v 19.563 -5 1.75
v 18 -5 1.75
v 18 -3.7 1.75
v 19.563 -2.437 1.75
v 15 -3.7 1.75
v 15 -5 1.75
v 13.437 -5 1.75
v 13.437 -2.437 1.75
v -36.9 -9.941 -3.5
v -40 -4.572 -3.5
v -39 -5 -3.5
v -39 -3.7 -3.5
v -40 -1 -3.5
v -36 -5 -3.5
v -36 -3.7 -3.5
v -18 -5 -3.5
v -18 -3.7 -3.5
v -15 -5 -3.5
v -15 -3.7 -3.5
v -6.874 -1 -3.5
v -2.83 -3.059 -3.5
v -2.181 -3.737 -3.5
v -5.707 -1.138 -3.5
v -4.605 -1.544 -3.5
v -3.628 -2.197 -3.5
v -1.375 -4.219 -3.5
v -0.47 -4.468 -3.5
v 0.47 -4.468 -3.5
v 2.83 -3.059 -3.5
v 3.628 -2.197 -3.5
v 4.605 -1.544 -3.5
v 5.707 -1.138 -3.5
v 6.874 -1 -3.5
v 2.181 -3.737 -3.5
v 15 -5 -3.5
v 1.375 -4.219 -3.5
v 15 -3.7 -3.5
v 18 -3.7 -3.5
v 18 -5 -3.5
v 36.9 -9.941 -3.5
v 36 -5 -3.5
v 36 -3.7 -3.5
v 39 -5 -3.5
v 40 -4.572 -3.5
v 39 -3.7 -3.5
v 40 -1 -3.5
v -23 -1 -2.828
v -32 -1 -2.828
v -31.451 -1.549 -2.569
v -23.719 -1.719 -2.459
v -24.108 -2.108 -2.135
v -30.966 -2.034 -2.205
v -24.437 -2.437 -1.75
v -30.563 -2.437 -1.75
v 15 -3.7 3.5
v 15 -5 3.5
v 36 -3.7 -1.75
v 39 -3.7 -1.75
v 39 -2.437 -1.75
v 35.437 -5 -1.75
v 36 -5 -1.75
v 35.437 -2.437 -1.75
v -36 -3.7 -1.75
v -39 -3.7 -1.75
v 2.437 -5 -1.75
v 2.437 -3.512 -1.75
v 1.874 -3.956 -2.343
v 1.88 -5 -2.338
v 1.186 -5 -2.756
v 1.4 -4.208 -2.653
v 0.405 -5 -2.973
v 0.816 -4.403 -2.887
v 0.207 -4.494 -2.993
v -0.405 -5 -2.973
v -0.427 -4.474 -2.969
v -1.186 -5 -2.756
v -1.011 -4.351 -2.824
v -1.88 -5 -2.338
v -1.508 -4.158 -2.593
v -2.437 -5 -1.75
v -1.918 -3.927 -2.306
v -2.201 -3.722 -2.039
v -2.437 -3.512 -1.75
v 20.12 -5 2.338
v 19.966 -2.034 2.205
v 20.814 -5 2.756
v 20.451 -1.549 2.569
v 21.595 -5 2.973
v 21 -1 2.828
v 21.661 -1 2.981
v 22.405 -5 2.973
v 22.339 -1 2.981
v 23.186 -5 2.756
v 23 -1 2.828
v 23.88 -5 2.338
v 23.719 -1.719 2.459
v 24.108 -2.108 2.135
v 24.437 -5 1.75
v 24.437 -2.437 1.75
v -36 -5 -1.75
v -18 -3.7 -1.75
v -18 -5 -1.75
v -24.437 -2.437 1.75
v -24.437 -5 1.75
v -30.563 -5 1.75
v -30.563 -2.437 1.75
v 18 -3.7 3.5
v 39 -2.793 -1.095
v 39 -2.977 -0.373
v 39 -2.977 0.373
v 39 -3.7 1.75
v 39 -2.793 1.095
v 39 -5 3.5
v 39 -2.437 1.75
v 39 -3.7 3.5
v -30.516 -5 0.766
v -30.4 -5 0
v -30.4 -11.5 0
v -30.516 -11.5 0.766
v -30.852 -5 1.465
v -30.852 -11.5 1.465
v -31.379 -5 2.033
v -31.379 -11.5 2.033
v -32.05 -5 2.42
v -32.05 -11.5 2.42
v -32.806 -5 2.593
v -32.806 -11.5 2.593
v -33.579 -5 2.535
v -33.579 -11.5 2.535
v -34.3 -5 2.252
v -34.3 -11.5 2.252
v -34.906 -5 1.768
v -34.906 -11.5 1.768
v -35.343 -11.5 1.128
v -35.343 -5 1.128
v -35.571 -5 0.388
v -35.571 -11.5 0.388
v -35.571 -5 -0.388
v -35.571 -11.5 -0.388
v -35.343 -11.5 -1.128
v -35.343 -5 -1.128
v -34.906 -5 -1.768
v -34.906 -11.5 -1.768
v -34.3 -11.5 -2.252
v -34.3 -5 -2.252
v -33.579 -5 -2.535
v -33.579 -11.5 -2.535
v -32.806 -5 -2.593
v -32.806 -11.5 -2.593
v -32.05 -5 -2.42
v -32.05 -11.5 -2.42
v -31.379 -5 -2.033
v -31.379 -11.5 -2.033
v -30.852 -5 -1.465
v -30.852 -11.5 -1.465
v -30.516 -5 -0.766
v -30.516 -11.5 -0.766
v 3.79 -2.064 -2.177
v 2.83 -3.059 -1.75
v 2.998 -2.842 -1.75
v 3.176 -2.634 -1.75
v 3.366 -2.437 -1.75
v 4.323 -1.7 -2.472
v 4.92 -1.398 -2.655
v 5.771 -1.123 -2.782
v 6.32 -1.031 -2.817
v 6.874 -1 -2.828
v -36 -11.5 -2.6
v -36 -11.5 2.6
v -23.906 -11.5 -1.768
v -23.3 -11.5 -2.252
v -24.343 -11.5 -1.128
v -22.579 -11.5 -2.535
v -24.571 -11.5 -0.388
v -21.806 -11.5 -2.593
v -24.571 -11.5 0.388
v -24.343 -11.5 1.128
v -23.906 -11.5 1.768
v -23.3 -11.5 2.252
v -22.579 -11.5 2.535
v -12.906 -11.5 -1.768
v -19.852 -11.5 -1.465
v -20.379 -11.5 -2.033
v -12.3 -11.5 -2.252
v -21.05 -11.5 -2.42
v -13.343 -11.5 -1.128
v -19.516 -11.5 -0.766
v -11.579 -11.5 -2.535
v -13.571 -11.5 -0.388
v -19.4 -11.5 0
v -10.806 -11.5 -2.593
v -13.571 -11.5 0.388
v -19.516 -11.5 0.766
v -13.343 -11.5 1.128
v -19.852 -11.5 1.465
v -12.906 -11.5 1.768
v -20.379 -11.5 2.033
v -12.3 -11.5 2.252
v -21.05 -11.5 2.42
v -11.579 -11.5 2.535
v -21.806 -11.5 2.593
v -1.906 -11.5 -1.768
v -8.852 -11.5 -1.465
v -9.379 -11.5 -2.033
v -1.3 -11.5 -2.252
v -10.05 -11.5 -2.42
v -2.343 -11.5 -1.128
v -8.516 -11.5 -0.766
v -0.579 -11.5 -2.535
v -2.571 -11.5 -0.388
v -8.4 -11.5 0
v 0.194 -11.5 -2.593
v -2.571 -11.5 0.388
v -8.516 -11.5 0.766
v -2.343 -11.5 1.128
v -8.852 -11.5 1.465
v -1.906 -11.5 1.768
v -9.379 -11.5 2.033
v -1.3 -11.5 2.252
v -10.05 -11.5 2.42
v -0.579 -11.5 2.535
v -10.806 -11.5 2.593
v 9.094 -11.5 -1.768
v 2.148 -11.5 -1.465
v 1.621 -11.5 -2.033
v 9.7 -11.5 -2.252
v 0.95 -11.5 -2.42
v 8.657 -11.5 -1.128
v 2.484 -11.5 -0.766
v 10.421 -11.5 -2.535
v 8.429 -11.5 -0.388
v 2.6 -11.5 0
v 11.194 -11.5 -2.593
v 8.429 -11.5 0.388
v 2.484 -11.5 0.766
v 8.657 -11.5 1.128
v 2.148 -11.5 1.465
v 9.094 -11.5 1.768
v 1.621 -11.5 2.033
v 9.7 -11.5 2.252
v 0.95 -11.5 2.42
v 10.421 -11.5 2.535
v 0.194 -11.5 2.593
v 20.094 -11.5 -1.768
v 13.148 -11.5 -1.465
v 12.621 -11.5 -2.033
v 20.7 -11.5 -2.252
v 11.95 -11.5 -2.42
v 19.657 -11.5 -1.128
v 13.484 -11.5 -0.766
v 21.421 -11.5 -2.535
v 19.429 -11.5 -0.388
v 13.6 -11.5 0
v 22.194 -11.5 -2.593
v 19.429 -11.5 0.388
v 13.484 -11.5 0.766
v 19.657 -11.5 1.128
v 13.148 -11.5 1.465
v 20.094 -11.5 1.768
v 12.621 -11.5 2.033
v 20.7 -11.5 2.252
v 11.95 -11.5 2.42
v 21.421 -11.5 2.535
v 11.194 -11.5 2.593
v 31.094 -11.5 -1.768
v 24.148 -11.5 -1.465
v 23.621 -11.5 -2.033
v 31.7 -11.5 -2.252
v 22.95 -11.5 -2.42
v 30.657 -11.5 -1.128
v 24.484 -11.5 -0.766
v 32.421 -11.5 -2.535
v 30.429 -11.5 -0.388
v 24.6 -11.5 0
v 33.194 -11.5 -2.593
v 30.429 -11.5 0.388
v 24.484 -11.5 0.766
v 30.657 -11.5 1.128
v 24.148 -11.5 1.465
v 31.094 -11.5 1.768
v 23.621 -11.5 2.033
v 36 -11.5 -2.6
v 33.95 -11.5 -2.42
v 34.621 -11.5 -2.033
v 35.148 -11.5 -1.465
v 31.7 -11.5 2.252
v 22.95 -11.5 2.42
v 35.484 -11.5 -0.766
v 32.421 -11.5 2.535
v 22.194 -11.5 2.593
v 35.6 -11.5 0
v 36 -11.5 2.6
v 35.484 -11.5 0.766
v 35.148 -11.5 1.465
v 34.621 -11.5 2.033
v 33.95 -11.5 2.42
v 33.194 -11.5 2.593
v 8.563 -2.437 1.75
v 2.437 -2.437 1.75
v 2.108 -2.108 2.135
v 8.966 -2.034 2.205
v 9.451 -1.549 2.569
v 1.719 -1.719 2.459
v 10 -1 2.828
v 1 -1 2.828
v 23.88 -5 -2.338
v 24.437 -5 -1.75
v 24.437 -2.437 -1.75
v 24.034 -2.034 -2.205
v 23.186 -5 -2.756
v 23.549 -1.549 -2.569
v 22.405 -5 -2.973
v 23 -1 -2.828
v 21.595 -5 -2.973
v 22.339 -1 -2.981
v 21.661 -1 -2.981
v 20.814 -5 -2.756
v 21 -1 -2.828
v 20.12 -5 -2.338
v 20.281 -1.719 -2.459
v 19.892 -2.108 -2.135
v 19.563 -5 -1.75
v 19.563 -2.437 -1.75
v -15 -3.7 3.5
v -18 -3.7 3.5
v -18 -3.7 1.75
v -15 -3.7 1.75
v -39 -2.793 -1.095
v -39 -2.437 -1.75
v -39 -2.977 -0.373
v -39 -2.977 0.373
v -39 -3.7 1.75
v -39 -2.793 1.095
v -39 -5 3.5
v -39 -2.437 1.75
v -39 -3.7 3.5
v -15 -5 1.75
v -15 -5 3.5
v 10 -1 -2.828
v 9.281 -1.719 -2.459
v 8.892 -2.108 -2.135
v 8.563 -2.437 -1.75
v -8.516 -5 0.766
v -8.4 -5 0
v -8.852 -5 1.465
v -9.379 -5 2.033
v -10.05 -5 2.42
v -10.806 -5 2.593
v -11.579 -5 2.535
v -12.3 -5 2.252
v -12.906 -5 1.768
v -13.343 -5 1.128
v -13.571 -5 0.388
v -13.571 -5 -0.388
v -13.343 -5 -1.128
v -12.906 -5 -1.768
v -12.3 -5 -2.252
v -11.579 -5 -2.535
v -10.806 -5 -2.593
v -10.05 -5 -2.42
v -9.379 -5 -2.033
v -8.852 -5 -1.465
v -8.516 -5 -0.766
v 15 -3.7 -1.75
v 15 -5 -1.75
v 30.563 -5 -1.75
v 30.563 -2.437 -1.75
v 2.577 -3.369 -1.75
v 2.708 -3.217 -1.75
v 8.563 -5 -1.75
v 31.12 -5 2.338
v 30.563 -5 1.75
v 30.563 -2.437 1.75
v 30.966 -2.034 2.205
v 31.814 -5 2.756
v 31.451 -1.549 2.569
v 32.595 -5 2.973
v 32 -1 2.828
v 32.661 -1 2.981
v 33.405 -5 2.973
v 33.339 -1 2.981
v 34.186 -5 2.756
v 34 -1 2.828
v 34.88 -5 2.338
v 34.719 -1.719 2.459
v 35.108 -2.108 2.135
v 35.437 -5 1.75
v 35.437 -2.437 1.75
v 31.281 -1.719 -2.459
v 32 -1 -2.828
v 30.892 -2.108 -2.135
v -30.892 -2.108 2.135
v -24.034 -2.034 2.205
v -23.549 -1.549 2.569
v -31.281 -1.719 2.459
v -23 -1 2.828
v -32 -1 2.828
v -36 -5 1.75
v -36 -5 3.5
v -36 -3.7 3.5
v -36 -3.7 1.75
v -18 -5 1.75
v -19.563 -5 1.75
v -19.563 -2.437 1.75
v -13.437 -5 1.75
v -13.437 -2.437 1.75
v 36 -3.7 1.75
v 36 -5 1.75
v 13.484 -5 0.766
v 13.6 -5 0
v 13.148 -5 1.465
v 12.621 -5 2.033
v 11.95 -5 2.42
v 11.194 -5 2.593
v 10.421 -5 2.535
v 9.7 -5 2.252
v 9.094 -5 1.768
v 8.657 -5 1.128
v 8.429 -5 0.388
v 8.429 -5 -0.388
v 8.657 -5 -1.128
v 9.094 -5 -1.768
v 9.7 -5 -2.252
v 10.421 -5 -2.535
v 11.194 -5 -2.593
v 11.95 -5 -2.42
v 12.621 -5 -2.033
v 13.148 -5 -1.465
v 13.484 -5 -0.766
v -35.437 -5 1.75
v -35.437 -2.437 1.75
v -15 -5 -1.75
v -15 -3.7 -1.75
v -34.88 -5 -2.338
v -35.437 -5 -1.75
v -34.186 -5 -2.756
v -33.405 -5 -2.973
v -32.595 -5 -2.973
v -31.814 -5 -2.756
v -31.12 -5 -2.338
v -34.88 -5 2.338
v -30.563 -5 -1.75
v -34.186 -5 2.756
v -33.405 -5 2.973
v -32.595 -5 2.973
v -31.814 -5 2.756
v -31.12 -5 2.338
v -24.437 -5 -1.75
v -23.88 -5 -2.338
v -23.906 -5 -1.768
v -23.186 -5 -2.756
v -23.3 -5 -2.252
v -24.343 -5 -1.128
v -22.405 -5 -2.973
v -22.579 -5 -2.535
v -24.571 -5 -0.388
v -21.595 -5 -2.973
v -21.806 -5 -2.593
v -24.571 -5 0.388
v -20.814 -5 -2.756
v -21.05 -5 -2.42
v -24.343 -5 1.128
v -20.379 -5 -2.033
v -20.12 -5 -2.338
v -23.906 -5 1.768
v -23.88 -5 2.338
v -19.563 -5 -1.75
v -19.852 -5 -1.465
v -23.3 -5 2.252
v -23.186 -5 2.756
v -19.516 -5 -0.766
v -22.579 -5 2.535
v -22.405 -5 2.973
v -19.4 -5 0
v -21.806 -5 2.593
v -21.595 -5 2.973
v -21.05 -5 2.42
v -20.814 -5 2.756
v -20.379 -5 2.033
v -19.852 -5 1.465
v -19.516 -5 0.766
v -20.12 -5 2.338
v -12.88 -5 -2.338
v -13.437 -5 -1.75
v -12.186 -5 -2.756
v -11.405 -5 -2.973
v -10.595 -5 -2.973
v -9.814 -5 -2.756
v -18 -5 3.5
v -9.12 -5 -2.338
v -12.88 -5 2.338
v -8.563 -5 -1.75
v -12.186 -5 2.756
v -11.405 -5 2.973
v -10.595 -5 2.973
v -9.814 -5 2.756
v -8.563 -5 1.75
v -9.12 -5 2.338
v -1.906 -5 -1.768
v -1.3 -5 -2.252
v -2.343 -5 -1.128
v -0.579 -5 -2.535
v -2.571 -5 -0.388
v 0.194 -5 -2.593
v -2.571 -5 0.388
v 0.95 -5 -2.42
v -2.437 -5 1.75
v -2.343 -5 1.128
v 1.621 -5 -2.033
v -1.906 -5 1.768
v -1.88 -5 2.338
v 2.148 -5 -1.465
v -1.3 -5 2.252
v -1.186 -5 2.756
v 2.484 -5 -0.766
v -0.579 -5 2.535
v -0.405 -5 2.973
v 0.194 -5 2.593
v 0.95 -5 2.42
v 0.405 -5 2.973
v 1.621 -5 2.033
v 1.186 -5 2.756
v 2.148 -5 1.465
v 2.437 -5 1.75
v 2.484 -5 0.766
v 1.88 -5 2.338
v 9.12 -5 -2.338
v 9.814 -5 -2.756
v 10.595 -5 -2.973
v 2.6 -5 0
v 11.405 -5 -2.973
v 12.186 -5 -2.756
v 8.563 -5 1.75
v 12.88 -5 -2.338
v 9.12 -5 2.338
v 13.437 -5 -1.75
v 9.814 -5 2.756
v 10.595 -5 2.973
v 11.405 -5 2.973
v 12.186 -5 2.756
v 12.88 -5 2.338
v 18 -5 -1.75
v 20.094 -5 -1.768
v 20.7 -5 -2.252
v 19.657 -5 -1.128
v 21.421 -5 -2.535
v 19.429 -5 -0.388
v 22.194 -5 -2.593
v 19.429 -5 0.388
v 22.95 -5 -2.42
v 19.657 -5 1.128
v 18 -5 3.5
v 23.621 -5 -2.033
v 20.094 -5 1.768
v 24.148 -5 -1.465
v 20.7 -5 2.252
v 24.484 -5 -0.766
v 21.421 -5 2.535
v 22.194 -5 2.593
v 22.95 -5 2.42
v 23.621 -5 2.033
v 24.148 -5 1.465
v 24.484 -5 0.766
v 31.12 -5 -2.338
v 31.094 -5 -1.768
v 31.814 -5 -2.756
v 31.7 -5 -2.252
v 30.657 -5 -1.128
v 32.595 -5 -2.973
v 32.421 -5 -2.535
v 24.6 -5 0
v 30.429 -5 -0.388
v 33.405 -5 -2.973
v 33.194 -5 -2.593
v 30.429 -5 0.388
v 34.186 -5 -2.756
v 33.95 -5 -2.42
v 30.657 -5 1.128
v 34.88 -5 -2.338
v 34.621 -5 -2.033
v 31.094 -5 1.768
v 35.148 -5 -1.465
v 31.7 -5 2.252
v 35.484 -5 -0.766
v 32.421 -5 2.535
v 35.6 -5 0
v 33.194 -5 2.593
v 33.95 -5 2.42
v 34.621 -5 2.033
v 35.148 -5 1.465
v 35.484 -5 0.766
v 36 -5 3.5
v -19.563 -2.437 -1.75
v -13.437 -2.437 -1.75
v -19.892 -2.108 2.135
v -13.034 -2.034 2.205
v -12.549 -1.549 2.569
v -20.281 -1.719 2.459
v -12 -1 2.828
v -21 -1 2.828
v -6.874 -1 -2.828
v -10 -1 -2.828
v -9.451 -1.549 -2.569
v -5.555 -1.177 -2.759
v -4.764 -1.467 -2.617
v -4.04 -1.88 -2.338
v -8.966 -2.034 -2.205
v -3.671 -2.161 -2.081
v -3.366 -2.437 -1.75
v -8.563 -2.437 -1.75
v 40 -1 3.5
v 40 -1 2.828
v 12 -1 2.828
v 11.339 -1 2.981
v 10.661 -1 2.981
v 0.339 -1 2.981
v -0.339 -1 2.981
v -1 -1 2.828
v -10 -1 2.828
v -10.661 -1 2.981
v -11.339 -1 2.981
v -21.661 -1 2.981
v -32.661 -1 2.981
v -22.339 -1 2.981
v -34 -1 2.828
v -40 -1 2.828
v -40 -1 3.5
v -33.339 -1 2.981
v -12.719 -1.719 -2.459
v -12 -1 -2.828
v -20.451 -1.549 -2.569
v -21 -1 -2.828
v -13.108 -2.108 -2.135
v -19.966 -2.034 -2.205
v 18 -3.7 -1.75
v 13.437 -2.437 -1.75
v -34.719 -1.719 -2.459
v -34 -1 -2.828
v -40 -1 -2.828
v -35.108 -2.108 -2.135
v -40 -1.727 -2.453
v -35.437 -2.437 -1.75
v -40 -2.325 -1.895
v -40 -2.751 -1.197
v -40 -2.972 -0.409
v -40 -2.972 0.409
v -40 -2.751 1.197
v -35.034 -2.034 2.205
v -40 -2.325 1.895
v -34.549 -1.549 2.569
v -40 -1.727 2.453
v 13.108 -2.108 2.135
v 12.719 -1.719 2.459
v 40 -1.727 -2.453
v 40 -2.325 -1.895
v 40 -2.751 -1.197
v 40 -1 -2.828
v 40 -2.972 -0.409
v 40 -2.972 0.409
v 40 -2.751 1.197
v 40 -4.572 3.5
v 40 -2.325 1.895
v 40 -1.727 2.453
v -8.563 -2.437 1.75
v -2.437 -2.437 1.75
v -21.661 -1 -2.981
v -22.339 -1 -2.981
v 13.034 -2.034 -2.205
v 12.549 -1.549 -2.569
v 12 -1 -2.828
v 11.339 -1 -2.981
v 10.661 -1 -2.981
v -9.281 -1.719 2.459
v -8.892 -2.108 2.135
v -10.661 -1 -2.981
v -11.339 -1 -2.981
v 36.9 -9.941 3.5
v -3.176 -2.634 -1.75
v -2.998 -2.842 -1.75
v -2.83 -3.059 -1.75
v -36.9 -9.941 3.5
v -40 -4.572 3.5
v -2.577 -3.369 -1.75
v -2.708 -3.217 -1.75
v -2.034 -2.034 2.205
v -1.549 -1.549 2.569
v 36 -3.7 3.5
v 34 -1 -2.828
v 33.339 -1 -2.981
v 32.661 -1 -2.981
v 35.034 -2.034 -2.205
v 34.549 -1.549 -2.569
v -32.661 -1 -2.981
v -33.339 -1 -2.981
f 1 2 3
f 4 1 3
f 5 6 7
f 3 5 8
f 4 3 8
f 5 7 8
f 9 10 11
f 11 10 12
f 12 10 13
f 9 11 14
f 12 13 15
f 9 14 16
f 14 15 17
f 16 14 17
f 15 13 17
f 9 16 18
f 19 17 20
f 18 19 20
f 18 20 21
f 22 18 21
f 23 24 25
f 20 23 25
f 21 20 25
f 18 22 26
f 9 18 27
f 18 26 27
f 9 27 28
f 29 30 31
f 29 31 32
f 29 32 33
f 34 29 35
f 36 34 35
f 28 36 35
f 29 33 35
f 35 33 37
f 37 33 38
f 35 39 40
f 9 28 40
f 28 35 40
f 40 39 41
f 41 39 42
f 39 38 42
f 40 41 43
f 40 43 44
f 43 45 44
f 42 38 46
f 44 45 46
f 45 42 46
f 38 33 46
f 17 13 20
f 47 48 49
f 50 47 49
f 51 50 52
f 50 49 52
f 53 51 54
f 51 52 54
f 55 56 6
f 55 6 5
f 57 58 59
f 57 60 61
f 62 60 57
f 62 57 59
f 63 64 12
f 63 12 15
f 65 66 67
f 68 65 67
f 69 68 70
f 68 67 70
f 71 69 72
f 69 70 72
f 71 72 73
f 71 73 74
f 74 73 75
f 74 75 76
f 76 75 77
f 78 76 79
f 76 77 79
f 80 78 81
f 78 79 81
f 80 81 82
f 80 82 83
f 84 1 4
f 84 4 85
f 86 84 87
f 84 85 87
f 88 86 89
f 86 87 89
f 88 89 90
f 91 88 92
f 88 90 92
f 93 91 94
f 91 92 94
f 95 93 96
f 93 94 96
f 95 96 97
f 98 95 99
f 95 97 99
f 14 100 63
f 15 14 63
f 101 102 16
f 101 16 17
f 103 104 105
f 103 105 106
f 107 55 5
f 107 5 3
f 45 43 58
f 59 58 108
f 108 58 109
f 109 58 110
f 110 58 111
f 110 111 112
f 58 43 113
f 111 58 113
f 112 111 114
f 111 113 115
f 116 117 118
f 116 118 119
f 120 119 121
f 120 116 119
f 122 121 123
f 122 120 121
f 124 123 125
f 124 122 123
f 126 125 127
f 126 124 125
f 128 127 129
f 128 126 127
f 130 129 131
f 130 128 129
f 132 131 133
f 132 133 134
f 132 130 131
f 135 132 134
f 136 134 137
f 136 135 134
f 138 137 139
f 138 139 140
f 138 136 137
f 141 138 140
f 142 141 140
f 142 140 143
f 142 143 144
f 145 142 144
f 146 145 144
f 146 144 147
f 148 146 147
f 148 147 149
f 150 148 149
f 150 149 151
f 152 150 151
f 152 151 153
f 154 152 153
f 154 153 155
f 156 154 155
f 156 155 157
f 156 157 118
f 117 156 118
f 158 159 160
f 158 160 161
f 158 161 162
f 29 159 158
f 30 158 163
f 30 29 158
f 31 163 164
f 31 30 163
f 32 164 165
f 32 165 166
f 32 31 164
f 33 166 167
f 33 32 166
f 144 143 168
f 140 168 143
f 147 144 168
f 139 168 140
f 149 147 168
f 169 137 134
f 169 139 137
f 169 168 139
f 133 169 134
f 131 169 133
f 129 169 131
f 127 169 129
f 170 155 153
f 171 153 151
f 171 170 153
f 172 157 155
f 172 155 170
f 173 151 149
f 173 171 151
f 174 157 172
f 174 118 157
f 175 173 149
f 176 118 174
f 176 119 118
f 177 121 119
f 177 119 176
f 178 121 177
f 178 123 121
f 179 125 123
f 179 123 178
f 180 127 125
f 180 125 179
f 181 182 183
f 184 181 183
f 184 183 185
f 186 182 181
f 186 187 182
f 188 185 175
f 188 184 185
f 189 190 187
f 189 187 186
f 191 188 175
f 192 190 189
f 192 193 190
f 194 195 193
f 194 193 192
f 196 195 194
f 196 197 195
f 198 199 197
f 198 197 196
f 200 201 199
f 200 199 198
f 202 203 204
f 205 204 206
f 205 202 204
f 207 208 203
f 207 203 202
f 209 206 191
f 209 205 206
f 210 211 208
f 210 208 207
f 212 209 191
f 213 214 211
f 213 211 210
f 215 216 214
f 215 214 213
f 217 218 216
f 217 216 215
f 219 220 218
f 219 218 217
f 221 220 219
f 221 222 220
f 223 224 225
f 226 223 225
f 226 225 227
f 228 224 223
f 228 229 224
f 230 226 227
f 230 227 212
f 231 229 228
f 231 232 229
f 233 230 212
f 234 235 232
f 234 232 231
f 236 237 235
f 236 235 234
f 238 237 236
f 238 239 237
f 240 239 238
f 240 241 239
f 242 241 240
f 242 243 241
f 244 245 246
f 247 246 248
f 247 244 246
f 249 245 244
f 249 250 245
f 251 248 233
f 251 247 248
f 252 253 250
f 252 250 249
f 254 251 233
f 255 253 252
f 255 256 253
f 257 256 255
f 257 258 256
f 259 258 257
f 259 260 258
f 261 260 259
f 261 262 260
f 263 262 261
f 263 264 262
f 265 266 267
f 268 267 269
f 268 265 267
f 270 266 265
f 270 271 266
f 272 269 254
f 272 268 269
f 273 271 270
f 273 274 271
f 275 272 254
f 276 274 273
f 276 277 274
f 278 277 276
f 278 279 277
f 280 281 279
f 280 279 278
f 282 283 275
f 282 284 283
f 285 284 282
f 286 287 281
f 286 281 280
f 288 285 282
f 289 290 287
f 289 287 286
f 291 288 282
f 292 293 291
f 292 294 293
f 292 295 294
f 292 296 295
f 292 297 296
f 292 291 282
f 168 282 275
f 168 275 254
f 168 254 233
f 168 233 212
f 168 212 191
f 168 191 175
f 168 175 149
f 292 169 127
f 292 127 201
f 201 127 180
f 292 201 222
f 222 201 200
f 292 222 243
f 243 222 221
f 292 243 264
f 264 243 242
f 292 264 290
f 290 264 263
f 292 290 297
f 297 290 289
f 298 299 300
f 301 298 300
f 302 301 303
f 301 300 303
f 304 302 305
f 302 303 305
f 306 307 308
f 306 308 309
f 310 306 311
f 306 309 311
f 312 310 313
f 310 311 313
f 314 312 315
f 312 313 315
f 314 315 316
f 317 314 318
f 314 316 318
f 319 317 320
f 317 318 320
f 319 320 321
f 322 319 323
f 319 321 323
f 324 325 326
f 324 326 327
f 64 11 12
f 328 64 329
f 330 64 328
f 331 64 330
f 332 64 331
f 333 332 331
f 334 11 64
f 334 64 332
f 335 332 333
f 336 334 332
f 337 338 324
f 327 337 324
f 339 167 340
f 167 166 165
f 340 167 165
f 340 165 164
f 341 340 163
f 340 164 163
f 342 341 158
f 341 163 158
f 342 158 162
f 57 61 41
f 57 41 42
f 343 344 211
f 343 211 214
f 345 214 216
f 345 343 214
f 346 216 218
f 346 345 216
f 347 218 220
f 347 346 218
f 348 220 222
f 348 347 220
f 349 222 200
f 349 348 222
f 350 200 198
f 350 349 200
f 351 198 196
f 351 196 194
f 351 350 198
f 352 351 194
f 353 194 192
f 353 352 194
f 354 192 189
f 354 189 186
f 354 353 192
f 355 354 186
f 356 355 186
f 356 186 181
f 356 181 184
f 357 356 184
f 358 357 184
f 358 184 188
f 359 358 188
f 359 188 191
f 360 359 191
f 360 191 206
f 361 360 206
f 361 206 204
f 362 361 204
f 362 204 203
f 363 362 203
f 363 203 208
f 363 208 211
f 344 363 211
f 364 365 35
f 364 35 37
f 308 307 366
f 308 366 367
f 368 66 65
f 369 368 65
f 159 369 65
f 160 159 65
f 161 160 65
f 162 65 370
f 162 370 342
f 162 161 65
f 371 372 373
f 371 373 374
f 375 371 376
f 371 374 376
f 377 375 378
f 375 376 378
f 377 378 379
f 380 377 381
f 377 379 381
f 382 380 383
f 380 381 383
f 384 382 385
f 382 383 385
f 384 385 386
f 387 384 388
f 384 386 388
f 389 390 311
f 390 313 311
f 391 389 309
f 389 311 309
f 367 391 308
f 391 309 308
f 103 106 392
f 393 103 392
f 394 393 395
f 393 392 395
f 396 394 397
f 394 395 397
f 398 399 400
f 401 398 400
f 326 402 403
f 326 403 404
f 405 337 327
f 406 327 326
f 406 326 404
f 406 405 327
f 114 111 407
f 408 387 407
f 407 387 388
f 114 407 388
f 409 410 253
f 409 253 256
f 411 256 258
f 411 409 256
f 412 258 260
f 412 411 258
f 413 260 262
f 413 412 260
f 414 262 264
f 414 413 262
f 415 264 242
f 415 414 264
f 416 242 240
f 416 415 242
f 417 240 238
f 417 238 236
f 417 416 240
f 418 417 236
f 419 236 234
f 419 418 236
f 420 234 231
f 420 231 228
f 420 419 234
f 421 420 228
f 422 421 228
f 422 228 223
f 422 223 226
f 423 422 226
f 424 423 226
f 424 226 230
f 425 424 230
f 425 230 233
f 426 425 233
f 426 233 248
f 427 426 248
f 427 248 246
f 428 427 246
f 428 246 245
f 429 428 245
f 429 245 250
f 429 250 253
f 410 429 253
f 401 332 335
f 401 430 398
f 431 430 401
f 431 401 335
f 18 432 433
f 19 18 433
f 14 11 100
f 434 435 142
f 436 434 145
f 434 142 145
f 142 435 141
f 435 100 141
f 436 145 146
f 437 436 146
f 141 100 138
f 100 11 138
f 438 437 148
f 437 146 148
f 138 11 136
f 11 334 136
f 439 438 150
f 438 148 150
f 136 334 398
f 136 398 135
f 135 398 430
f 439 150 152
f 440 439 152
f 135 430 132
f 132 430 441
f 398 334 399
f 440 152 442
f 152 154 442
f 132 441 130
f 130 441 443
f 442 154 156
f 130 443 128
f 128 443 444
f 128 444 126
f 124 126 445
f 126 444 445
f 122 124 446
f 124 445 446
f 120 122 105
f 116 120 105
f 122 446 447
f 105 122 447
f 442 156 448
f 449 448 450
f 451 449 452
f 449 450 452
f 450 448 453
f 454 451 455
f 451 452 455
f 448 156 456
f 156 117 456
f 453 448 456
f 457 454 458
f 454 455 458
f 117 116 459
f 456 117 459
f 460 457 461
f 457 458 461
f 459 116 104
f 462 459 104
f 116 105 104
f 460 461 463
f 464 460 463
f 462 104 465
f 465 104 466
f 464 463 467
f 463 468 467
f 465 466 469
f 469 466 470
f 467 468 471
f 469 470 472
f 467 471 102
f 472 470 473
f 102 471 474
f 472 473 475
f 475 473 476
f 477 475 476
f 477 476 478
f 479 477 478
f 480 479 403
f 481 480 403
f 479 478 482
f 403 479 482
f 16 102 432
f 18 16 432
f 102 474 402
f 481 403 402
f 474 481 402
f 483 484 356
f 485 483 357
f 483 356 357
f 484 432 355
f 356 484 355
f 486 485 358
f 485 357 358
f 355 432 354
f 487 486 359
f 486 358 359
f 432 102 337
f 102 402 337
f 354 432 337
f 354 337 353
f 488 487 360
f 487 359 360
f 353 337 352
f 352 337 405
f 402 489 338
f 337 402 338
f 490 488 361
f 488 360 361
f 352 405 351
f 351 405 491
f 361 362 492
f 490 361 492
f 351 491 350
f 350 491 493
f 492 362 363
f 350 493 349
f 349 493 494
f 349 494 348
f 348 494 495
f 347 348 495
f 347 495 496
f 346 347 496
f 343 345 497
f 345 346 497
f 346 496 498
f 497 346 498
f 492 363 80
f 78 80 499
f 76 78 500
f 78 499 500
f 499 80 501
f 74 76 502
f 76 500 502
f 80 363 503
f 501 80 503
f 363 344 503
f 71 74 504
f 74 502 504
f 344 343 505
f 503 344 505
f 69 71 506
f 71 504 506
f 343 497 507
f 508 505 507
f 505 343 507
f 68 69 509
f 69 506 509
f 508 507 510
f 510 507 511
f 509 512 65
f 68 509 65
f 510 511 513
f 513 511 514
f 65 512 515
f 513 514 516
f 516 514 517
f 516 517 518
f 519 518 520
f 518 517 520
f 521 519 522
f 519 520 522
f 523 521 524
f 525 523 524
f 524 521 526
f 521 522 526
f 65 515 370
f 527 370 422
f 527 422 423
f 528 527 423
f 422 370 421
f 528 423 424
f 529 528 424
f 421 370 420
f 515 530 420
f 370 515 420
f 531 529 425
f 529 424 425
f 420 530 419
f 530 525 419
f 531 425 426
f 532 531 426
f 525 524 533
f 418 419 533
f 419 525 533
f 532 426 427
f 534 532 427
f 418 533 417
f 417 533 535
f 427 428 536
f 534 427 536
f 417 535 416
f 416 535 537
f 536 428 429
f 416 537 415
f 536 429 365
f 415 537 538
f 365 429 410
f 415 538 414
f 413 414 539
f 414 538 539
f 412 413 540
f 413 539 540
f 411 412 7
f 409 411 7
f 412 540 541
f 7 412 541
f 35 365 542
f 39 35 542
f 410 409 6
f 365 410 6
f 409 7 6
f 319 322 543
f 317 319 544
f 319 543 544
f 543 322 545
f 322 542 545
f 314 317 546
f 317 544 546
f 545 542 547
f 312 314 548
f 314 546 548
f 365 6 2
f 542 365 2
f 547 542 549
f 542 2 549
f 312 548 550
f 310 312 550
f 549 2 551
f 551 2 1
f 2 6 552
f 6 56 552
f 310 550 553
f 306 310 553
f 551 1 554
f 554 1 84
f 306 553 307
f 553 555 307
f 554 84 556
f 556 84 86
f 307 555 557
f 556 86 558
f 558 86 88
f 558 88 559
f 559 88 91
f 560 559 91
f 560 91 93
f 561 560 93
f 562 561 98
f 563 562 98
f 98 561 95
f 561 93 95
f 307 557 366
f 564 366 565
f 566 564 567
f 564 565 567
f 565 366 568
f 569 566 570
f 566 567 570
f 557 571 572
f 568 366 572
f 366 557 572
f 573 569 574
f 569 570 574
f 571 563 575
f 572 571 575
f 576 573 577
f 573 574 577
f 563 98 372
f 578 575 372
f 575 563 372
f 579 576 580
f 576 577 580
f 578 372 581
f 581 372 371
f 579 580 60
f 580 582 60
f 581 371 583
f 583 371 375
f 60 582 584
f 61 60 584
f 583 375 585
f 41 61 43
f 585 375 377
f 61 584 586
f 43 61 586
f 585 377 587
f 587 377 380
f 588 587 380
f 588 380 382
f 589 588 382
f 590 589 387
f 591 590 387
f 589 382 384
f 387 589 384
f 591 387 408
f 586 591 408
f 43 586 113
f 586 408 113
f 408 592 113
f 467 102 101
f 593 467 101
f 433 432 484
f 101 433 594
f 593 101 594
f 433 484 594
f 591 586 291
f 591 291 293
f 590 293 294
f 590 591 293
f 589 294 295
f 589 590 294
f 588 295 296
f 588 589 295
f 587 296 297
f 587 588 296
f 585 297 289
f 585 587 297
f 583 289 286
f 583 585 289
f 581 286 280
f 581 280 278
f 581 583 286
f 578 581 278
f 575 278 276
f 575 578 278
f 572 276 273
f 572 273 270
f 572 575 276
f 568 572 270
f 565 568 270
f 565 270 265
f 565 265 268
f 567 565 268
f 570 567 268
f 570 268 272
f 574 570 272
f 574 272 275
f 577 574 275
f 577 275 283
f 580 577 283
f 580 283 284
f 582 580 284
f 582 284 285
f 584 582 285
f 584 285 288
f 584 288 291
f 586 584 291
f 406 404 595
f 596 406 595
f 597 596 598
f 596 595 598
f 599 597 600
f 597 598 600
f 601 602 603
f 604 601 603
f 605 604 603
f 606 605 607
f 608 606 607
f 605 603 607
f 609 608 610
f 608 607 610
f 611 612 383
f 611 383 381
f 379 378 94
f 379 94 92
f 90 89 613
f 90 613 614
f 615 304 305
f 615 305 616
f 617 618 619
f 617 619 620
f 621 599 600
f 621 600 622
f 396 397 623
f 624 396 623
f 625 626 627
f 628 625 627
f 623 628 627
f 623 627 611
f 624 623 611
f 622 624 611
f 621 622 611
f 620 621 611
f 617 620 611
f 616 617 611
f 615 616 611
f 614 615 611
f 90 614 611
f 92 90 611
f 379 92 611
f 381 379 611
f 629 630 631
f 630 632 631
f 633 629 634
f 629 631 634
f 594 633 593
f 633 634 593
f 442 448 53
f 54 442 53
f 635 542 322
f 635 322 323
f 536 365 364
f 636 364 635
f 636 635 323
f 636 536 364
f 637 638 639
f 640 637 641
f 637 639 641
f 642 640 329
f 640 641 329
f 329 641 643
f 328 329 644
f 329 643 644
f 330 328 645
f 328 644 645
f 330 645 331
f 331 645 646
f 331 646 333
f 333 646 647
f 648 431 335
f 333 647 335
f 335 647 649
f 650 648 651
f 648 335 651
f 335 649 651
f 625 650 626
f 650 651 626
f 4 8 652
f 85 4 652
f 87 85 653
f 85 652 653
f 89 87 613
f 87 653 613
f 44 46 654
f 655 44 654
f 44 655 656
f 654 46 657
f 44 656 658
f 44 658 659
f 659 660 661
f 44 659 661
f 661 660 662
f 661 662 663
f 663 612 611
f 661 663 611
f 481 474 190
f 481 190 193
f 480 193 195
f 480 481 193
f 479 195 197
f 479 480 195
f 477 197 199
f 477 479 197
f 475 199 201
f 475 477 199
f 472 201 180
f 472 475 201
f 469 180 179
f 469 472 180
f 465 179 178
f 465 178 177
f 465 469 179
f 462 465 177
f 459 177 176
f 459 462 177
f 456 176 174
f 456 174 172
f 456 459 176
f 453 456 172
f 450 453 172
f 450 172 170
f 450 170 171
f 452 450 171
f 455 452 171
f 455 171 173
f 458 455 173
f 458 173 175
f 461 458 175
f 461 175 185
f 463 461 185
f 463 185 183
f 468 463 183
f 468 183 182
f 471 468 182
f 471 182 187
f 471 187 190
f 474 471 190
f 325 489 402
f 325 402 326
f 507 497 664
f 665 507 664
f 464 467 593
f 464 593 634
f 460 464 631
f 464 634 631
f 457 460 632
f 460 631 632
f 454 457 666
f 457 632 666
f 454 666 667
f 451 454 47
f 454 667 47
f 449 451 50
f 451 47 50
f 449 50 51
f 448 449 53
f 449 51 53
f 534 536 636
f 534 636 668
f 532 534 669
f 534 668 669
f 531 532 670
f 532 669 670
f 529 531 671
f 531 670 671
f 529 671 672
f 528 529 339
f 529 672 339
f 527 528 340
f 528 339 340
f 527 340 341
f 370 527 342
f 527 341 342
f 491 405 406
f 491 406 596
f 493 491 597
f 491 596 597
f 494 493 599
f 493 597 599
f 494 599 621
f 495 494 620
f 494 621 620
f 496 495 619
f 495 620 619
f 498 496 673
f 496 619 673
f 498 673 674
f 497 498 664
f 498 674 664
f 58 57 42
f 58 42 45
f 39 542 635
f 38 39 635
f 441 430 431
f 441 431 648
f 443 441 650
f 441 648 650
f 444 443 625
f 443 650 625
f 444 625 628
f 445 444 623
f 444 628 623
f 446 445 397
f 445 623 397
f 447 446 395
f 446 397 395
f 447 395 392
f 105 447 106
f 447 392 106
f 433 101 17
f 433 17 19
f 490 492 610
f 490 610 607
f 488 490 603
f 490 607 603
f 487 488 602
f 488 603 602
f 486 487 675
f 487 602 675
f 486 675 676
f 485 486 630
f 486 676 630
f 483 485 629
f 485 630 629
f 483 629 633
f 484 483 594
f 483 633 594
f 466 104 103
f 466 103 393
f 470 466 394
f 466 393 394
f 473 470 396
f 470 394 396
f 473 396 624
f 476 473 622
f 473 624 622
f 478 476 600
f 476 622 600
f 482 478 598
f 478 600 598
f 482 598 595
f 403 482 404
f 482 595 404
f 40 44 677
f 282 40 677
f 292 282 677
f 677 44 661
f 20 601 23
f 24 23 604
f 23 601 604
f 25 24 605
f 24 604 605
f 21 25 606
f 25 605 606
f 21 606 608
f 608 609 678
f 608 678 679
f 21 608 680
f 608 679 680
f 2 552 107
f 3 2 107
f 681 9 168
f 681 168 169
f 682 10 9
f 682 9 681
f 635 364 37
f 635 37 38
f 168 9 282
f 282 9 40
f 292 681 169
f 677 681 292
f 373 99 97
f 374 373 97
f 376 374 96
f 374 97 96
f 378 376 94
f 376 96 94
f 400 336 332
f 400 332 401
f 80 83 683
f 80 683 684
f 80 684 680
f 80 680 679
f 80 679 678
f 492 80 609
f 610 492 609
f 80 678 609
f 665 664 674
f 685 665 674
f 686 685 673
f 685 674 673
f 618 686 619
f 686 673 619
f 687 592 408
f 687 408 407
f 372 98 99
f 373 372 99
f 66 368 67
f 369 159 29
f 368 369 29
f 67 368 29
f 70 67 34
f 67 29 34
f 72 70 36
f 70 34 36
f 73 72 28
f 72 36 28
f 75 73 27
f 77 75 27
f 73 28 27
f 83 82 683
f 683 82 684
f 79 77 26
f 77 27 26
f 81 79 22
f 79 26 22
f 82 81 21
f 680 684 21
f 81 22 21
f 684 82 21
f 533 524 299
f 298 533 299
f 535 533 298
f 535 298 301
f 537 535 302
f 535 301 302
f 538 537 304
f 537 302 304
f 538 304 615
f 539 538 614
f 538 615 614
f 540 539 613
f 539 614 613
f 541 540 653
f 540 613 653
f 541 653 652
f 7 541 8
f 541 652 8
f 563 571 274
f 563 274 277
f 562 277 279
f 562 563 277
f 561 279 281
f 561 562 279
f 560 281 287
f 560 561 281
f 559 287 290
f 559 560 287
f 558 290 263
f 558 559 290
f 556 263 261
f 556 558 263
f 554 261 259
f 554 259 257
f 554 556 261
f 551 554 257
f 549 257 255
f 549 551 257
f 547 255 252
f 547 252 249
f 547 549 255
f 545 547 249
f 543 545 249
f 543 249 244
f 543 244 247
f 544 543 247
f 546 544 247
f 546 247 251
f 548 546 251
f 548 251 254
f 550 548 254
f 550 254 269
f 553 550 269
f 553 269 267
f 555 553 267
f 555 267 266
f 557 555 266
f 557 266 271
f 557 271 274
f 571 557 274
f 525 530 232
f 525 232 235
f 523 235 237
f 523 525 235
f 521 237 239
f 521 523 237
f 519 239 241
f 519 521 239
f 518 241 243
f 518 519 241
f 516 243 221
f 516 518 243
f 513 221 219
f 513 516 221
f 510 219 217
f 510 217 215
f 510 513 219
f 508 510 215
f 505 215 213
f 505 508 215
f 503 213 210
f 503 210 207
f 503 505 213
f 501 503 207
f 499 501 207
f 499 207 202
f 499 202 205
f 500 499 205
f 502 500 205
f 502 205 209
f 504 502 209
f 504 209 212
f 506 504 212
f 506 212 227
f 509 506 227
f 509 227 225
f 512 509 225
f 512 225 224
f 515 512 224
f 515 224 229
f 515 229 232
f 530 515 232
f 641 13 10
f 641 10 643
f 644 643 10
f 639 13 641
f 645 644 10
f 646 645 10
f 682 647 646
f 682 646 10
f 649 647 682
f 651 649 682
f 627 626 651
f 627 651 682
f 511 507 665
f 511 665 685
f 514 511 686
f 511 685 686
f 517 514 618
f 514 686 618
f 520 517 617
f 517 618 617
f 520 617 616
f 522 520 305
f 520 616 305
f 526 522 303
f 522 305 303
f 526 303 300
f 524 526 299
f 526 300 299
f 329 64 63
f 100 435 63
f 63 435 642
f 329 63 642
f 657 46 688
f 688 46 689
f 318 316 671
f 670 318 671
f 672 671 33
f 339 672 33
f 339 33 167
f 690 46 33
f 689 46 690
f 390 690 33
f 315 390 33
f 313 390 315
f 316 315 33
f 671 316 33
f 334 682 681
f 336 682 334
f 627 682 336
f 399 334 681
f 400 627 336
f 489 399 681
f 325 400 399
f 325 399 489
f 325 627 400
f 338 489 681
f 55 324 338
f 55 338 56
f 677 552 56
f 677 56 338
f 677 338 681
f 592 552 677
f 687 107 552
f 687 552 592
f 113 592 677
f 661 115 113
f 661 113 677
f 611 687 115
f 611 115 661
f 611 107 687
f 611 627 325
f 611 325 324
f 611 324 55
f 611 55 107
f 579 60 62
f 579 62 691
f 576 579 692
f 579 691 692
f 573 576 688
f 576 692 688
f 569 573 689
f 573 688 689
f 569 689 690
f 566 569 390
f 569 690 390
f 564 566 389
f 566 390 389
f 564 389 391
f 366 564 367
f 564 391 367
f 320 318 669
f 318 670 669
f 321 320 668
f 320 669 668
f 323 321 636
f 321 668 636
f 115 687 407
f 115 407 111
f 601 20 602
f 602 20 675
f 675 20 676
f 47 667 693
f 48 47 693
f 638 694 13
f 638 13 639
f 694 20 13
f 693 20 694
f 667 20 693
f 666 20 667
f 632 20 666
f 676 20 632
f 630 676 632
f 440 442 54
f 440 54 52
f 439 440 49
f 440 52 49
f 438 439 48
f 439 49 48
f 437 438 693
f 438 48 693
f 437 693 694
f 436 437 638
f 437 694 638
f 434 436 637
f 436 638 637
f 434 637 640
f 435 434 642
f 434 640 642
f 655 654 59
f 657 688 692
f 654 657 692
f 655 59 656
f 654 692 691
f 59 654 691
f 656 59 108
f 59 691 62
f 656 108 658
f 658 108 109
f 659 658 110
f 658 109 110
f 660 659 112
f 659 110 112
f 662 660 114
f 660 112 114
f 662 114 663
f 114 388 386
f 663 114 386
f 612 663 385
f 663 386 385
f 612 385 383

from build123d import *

# Parameters (mm, degrees)
F0_W          = 80
F0_H          = 7
F0_R          = 2.6
F1_DEPTH      = 11.5
F2_R          = 3
F3_DEPTH      = 5
F4_R          = 3
F5_DEPTH      = 80.001
F6_W          = 4
F6_H          = 3.5
F7_DEPTH      = 39
F7_DEPTH_BACK = 39
F8_SIZE2      = 6.9282032303
F8_SIZE       = 4
F9_SIZE2      = 1.558836
F9_SIZE       = 0.89999
F10_W         = 2
F10_H         = 10.311042398
F11_DEPTH     = 80.001
F12_R         = 3.5
F13_DEPTH     = 1.75
F14_T4_DEPTH  = 17.5408905874
F14_T9_DEPTH  = 17.5408905874
F15_W         = 3
F15_H         = 1.3
F16_DEPTH     = 7.0010001


# Not quite as in the source:
# - a fillet or chamfer that OpenCascade refuses, or shapes differently, is made with other operations: its cross-section is extruded or revolved along the edge and cut away or added
# - a fillet or chamfer is up to 0.001 mm smaller than in the source, because OpenCascade refuses the exact size


with BuildPart() as f1:
    # F0 (on Front) → F1 (new body)
    with BuildSketch(Plane.XZ):
        Rectangle(F0_W, F0_H)
        with Locations((-33, 0)):
            Circle(F0_R, mode=Mode.SUBTRACT)
        with Locations((-22, 0)):
            Circle(F0_R, mode=Mode.SUBTRACT)
        with Locations((-11, 0)):
            Circle(F0_R, mode=Mode.SUBTRACT)
        Circle(F0_R, mode=Mode.SUBTRACT)
        with Locations((11, 0)):
            Circle(F0_R, mode=Mode.SUBTRACT)
        with Locations((22, 0)):
            Circle(F0_R, mode=Mode.SUBTRACT)
        with Locations((33, 0)):
            Circle(F0_R, mode=Mode.SUBTRACT)
    extrude(amount=F1_DEPTH)

    # F2 (on face) → F3 (cut)
    with BuildSketch(Plane(origin=(0, 0, 0), x_dir=(-1, 0, 0), z_dir=(0, 1, 0))):
        Circle(F2_R)
        with Locations((11, 0)):
            Circle(F2_R)
        with Locations((22, 0)):
            Circle(F2_R)
        with Locations((33, 0)):
            Circle(F2_R)
        with Locations((-11, 0)):
            Circle(F2_R)
        with Locations((-22, 0)):
            Circle(F2_R)
        with Locations((-33, 0)):
            Circle(F2_R)
    extrude(amount=-F3_DEPTH, mode=Mode.SUBTRACT)

    # F4 (on face) → F5 (cut, through all)
    with BuildSketch(Plane(origin=(-40, 0, 0), x_dir=(0, -1, 0), z_dir=(-1, 0, 0))):
        Circle(F4_R)
    extrude(amount=-F5_DEPTH, mode=Mode.SUBTRACT)

    # F6 (on Right) → F7 (cut, two sides)
    with BuildSketch(Plane.YZ) as f7_sk:
        with Locations((-3, 0)):
            Rectangle(F6_W, F6_H)
    extrude(amount=-F7_DEPTH, mode=Mode.SUBTRACT)
    extrude(f7_sk.sketch, amount=F7_DEPTH_BACK, mode=Mode.SUBTRACT)

    # F8
    f8_edges = [f1.edges().sort_by_distance(p)[0] for p in [
        (-40, -11.5, 0),
        (40, -11.5, 0),
    ]]
    f8_side = f1.faces().sort_by_distance((39.196943, -11.5, 0))[0]
    chamfer(f8_edges, length=F8_SIZE, length2=F8_SIZE2, reference=f8_side)

    # F9 (size 0.9 and 1.5588457268 in the source; OpenCascade refuses exactly that, so slightly less here)
    f9_edges = [f1.edges().sort_by_distance(p)[0] for p in [
        (0, -11.5, 3.5),
        (0, -11.5, -3.5),
    ]]
    f9_side = f1.faces().sort_by_distance((0, -11.5, 2.776605))[0]
    chamfer(f9_edges, length=F9_SIZE, length2=F9_SIZE2, reference=f9_side)

    # F10 (on face) → F11 (cut, through all)
    with BuildSketch(Plane(origin=(-40, 0, 0), x_dir=(0, -1, 0), z_dir=(-1, 0, 0))):
        Rectangle(F10_W, F10_H)
    extrude(amount=-F11_DEPTH, mode=Mode.SUBTRACT)

    # F12 (on face) → F13 (cut, through all)
    with BuildSketch(Plane(origin=(0, 0, -3.5), x_dir=(1, 0, 0), z_dir=(0, 0, -1))):
        with Locations((0, 1)):
            Circle(F12_R)
    extrude(amount=-F13_DEPTH, mode=Mode.SUBTRACT)

    # F14: fillet of radius 5 on 2 edges, made by hand


with BuildPart() as f14_tool2:
    # F14_s3 → F14_t4 (new body)
    with BuildSketch(Plane.XY.offset(5.6062317314)):
        with BuildLine():
            ThreePointArc((-6.8738635424, -1), (-4.60515051, -1.5443360566), (-2.8304143998, -3.0588235294))
            ThreePointArc((-2.8304143998, -3.0588235294), (-3.3283967912, -2.0824854735), (-3.5, -1))
            Line((-3.5, -1), (-6.8738635424, -1))
        make_face()
    extrude(amount=-F14_T4_DEPTH)

    split(bisect_by=Plane.XY.offset(1.75), keep=Keep.BOTTOM)


with BuildPart() as f1_1:
    add(f1.part)

    # F14_t1: cut F14_tool2
    add(f14_tool2.part, mode=Mode.SUBTRACT)


with BuildPart() as f14_tool7:
    # F14_s8 → F14_t9 (new body)
    with BuildSketch(Plane.XY.offset(-11.9346588561)):
        with BuildLine():
            ThreePointArc((2.8304143998, -3.0588235294), (4.60515051, -1.5443360566), (6.8738635424, -1))
            Line((6.8738635424, -1), (3.5, -1))
            ThreePointArc((3.5, -1), (3.3283967912, -2.0824854735), (2.8304143998, -3.0588235294))
        make_face()
    extrude(amount=F14_T9_DEPTH)

    split(bisect_by=Plane.XY.offset(1.75), keep=Keep.BOTTOM)


with BuildPart() as f1_2:
    add(f1_1.part)

    # F14_t6: cut F14_tool7
    add(f14_tool7.part, mode=Mode.SUBTRACT)

    # F15 (on face) → F16 (cut, through all)
    with BuildSketch(Plane.XY.offset(3.5)):
        with Locations((37.5, -4.35)):
            Rectangle(F15_W, F15_H)
        with Locations((16.5, -4.35)):
            Rectangle(F15_W, F15_H)
        with Locations((-16.5, -4.35)):
            Rectangle(F15_W, F15_H)
        with Locations((-37.5, -4.35)):
            Rectangle(F15_W, F15_H)
    extrude(amount=-F16_DEPTH, mode=Mode.SUBTRACT)


solid = f1_2.part
